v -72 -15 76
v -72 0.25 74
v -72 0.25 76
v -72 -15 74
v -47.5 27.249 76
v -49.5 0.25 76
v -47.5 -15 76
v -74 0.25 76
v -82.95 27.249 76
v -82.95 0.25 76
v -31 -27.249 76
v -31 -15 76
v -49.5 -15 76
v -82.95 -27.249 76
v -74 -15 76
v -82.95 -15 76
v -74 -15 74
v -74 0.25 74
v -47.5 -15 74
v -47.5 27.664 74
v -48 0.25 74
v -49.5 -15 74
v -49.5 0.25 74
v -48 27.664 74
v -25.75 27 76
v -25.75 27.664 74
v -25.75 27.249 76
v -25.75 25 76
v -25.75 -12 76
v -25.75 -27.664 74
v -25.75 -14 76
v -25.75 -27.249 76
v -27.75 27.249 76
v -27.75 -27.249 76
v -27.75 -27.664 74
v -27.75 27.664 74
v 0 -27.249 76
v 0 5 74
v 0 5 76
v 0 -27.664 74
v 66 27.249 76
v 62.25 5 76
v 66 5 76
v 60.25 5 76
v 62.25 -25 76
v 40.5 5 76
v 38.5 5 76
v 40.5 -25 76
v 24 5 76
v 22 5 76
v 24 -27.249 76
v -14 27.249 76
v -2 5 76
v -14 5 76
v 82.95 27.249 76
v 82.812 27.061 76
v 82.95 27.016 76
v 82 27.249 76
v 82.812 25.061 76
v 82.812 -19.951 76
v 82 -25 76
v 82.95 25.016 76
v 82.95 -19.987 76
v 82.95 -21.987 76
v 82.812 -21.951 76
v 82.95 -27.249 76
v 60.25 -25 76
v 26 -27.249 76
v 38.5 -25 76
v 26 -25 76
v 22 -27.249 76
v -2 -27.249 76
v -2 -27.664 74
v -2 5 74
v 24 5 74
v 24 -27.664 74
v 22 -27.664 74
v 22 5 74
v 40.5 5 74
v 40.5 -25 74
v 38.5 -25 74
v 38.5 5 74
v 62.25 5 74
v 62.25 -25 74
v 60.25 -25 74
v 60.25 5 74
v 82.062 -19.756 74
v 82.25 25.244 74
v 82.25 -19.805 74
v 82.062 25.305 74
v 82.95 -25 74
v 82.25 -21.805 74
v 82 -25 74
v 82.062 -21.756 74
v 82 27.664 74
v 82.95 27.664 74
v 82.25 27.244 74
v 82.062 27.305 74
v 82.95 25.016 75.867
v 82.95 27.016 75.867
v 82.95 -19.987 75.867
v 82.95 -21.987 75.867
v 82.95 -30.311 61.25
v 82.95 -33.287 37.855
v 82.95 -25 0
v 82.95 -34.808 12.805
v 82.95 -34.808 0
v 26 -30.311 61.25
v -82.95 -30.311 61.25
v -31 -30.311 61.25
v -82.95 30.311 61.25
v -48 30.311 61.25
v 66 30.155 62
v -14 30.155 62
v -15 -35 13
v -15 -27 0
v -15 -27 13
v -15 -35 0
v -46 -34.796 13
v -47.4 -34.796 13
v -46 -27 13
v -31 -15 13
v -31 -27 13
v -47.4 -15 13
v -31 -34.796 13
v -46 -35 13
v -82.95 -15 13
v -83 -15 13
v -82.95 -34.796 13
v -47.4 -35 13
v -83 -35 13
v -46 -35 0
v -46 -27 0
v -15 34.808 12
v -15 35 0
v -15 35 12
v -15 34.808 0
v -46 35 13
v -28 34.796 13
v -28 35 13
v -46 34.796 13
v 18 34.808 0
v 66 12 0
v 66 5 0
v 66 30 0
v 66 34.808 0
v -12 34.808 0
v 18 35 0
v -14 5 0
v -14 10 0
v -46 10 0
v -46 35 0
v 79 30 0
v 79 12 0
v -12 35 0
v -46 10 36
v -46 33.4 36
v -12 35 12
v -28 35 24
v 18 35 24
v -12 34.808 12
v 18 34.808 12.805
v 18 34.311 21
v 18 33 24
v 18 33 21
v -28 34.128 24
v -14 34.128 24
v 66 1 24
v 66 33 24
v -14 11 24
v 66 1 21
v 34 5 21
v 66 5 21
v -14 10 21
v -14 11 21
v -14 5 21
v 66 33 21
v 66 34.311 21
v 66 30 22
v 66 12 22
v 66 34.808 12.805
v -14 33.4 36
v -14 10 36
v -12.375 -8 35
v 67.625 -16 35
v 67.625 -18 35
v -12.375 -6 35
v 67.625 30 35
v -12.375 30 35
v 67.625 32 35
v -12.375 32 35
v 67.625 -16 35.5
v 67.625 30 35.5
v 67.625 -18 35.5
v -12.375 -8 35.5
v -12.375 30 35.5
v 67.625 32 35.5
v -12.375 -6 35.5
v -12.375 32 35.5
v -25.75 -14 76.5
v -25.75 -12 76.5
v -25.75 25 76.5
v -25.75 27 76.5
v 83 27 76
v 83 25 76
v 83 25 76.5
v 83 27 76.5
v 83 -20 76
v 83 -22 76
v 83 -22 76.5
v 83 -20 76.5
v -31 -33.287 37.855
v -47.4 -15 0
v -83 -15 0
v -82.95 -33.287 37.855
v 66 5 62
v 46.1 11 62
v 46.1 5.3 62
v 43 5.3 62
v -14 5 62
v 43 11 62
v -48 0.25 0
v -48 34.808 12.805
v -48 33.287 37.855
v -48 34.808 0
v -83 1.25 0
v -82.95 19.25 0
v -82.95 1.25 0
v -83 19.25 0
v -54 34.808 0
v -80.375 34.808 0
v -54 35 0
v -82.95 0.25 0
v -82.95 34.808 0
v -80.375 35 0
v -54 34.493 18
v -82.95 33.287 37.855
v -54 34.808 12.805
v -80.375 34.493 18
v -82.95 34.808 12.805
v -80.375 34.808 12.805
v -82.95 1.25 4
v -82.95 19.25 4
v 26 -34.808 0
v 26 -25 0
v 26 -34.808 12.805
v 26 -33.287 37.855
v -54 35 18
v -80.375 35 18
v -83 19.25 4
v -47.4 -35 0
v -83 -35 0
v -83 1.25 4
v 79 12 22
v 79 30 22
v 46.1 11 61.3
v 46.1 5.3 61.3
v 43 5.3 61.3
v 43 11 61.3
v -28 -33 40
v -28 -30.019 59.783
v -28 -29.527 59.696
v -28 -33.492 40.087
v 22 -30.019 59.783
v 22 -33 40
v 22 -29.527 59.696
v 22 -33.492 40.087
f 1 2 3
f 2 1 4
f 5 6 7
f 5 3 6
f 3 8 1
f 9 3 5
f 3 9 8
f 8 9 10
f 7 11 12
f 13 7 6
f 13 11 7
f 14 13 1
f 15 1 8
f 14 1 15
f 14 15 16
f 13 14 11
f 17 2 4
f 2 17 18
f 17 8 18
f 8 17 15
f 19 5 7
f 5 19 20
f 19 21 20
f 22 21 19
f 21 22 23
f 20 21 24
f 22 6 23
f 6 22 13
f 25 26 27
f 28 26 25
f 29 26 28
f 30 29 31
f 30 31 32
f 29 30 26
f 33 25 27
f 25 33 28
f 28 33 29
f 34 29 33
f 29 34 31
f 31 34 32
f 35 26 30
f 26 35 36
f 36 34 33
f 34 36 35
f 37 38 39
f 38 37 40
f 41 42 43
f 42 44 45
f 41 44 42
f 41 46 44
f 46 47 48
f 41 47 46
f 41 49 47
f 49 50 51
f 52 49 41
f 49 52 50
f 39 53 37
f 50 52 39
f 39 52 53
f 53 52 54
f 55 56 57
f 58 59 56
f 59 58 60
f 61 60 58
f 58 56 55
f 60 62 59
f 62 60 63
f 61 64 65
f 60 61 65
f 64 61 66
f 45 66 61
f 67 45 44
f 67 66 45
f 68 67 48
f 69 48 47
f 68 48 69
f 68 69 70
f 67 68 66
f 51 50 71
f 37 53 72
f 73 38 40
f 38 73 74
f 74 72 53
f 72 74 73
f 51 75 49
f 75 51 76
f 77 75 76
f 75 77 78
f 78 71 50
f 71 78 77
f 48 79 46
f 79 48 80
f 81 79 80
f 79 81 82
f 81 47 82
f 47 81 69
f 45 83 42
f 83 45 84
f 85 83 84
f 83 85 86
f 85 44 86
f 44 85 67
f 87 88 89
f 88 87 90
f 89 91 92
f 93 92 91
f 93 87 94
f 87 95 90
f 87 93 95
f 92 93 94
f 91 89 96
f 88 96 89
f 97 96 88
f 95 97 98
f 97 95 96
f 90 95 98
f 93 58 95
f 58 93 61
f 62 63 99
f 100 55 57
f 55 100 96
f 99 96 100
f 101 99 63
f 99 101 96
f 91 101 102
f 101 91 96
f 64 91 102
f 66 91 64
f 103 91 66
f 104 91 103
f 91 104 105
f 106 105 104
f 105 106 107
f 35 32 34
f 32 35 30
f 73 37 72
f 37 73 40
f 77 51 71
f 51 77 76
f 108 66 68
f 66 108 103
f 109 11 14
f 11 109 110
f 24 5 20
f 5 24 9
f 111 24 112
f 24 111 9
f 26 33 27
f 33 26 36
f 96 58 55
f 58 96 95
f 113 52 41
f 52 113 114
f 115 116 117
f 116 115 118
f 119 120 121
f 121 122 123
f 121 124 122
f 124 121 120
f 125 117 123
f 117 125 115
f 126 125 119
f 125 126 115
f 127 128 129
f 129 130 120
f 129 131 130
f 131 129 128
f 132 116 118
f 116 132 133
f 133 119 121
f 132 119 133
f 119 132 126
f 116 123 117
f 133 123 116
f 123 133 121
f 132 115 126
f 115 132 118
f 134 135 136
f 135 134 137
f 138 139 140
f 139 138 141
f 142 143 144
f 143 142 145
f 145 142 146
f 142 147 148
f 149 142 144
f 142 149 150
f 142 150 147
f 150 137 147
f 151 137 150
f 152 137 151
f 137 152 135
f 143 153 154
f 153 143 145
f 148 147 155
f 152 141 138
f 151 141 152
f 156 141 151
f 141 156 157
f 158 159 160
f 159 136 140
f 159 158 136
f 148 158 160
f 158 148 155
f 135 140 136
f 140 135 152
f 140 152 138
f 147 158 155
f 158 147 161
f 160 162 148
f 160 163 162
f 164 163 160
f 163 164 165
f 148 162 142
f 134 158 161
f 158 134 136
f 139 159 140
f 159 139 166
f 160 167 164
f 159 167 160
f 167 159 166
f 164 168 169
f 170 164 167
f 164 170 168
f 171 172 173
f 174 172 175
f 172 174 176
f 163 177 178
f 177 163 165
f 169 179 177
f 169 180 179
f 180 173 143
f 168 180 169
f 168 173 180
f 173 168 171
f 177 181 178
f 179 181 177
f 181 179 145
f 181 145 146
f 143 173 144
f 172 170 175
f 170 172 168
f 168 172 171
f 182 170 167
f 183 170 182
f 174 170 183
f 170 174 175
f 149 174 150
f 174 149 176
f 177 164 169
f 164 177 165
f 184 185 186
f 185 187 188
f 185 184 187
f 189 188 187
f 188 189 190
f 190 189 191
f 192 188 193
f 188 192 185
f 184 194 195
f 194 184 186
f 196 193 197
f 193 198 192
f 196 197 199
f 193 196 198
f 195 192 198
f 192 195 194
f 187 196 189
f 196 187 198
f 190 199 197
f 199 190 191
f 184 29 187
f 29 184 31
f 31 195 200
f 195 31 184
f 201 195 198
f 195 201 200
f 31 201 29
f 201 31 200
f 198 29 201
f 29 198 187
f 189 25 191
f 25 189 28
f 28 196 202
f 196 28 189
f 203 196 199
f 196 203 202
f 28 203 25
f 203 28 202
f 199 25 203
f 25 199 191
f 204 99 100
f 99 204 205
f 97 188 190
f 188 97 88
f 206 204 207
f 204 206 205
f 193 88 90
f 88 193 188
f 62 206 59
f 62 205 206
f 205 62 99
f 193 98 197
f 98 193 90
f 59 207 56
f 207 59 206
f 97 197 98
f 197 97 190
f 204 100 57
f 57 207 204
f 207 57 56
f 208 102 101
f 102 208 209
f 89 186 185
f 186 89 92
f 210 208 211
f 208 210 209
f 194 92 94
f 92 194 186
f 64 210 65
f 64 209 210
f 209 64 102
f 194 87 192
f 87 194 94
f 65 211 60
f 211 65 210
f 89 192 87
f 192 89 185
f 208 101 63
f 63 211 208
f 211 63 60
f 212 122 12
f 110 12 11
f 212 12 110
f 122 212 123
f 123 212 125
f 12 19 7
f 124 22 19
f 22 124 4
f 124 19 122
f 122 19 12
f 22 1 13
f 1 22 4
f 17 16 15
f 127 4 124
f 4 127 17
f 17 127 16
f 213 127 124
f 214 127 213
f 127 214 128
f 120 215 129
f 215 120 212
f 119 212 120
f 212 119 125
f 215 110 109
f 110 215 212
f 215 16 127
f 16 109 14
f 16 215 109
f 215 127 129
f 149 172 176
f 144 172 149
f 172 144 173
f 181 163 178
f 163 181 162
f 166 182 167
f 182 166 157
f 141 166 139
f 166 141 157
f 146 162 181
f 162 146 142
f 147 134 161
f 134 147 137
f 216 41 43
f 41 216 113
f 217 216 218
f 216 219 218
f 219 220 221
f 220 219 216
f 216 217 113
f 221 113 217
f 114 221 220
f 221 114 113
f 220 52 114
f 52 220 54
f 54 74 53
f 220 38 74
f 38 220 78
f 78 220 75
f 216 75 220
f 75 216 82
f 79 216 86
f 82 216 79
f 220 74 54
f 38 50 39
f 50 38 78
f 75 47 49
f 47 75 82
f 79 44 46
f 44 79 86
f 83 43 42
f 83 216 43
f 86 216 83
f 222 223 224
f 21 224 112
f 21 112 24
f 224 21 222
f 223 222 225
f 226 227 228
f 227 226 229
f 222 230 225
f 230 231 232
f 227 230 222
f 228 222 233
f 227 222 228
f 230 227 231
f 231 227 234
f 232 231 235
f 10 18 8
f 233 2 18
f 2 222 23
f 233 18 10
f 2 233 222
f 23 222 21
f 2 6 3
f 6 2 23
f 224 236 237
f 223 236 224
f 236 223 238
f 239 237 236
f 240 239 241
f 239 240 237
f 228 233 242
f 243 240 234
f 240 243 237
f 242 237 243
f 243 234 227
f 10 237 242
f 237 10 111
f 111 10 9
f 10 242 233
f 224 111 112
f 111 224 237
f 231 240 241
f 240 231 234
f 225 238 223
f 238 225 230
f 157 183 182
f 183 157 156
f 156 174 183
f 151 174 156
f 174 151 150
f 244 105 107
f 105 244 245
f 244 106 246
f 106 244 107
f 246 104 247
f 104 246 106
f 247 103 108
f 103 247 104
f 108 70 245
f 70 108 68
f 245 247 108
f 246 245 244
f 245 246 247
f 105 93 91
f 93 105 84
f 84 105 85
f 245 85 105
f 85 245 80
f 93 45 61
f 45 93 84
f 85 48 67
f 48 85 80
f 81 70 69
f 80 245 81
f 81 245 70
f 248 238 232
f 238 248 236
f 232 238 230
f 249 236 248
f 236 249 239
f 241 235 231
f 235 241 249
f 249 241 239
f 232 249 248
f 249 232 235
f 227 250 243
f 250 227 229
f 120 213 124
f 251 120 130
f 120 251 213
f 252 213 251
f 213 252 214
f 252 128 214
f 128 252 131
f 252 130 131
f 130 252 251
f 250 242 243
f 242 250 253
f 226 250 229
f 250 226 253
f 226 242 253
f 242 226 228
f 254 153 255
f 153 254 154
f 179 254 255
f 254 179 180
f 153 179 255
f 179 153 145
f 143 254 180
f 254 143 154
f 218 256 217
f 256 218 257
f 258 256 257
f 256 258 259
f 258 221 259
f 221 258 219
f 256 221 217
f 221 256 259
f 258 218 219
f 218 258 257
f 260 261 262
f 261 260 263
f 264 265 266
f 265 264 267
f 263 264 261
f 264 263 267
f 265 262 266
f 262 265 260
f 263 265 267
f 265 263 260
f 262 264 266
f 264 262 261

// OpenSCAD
//van 
vw=70;
vh=76;
vwh=56;
vl=166;

//wheel 
wl=31;
wh=13;
ww=8;
wo=37;

//toilet
tw=15+3/4;
th=18;
tl=26+3/8;

//water tank
//TRI-WH-2030-4
//fw=13;
//fh=12;
//fl=46;
//TRI-WH-2031
fw=20;
fh=12;
fl=30;
//TRI-WH-2037  
/*fw=19;
fh=12;
fl=38;*/
//TRI-WH-2030
//gw=20;
//gh=7;
//gl=50;
//TRI-WH-2030-4 # FUCK BOUGHT WRONG TANK!
gw=13;
gh=12;
gl=46;

//webasto
webh=12+1;
//webw=15.4+1;
webw=19+1;
webl=34.6+1;


//bed
beds=55.25;
bedtotal=166-beds;
bedl=80;
bedw1=50;
bedw2=40;
bedh=0.5;
strapl=(bedtotal-bedl)/2;
strapw=2;
bede=strapl+beds+bedl;
seats=105;
seattotal=166-seats;
seatstrapl=(seattotal-bedl/2)/2;
seate=seatstrapl+seats+bedl/2;

//shower pan
sw=18;
sh=4;
sl=35;

//mattress
bedsplit=32;

//fridge
fridgel=18;
fridgew=18;
fridgeh=22;

//projector
pw=5.7;
pl=3.1;
ph=0.7;

//foldout desk
fol=50;
fow=20;
foldout=0;

//bathroom
bw=tw+sw+1;
bh=vh;
bl=35;

//kitchen
kw=25;
kh=36;
kl=32;
ko=37;
ks=ko;
ke=ko+kl;


module hull() {
    translate([0.05,vw/2,0]) scale([1,1,3.5]) rotate([0,90,0]) cylinder(h = vl-0.1, r1 = vw/2, r2 = vw/2, center = false);
}
module tank(l,w,h) {
    //outlet
    ow=1.25;
    oh=1;
    //inlet
    ih=1;
    iw=1.25;
    //vent
    vh=1;
    vw=0.5;
    //outet
    color("red") translate([0,w/2,ow/2+1]) rotate([0,90,0]) cylinder(h = oh, r1 = ow/2, r2 = ow/2, center = false);
    //vent
    color("red") translate([0,w-vw/2-1,h-vw/2-1]) rotate([0,90,0]) cylinder(h = vh, r1 = vw/2, r2 = vw/2, center = false);
    //inlet
    color("red") translate([0,w/2,h-ih/2-1]) rotate([0,90,0]) cylinder(h = ih, r1 = iw/2, r2 = iw/2, center = false);
    
    translate([ih,0,0]) cube([l,w,h]);
}

module bedleft(bedthick=3) { 
    intersection() {
        bedonly(bedthick=bedthick);
        cube([200,bedsplit,bedthick]);
    }
}
module bedright(bedthick=3) {
    translate([0,-bedsplit,wh]) difference() {
        bedonly(bedthick=bedthick);
        translate([-0.1,0,-0.1]) cube([200+0.2,bedsplit,    bedthick+0.2]);
    }
}
module strap(sp,ep,w=2,h=0.5) {
        points = [
          [  sp[0],  sp[1]-w/2,  sp[2] ],  //0
          [ ep[0],  ep[1]-w/2,  ep[2] ],  //1
          [ ep[0],  ep[1]+w/2,  ep[2] ],  //2
          [  sp[0],  sp[1]+w/2,  sp[2] ],  //3
          [  sp[0],  sp[1]-w/2,  sp[2]+h ],  //4
          [ ep[0],  ep[1]-w/2,  ep[2] +h],  //5
          [ ep[0],  ep[1]+w/2,  ep[2] +h],  //6
          [  sp[0],  sp[1]+w/2,  sp[2] +h]];  //7 
          
        faces = [
          [0,1,2,3],  // bottom
          [4,5,1,0],  // front
          [7,6,5,4],  // top
          [5,6,2,1],  // right
          [6,7,3,2],  // back
          [7,4,0,3]]; // left
        polyhedron( points, faces );
}


module bedloveseatonly(bedheight=0,bedthick=bedh) {
    bedpoints = [
          [  0,  (bedw1-bedw2)/2,  bedheight ],  //0
          [ bedl/2,  0,  bedheight ],  //1
          [ bedl/2,  bedw1,  bedheight ],  //2
          [  0,  bedw1,  bedheight ],  //3
          [  0,  (bedw1-bedw2)/2,  bedthick+bedheight ],  //4
          [ bedl/2,  0,  bedthick+bedheight ],  //5
          [ bedl/2,  bedw1,  bedthick+bedheight ],  //6
          [  0,  bedw1,  bedthick+bedheight ]]; //7
          
        bedfaces = [
          [0,1,2,3],  // bottom
          [4,5,1,0],  // front
          [7,6,5,4],  // top
          [5,6,2,1],  // right
          [6,7,3,2],  // back
          [7,4,0,3]]; // left
    polyhedron( bedpoints, bedfaces );
}



module bedonly(bedheight=0,bedthick=bedh) {
    bedpoints = [
          [  0,  bedw1-bedw2,  bedheight ],  //0
          [ bedl,  0,  bedheight ],  //1
          [ bedl,  bedw1,  bedheight ],  //2
          [  0,  bedw1,  bedheight ],  //3
          [  0,  bedw1-bedw2,  bedthick+bedheight ],  //4
          [ bedl,  0,  bedthick+bedheight ],  //5
          [ bedl,  bedw1,  bedthick+bedheight ],  //6
          [  0,  bedw1,  bedthick+bedheight ]]; //7
          
        bedfaces = [
          [0,1,2,3],  // bottom
          [4,5,1,0],  // front
          [7,6,5,4],  // top
          [5,6,2,1],  // right
          [6,7,3,2],  // back
          [7,4,0,3]]; // left
    polyhedron( bedpoints, bedfaces );
}

module bed(bedheight=0,bedthick=bedh) {
        translate([beds+strapl,vw-bedw1-3,0]) bedonly(bedheight,bedthick);
        
        //back left strap
        strap([beds+strapl,vw-bedw2-3+strapw/2,bedheight],[beds+2,(vw-vwh)/2+strapw+13,vh]);
        //back right
        strap([beds+strapl,vw-3-strapw/2,bedheight],[beds+2,vw-(vw-vwh)/2-strapw,vh]);
        //front right
        strap([bede,vw-3-strapw/2,bedheight],[bede+strapl,vw-(vw-vwh)/2-strapw,vh]);
        //front left
        strap([bede,vw-bedw1-3+strapw/2,bedheight],[bede+strapl,(vw-vwh)/2+strapw+5,vh]);
        
}
//bed(bedheight=35);

module bedloveseat(bedheight=0,bedthick=bedh) {
        translate([seats+seatstrapl,vw-bedw1-3,0]) bedloveseatonly(bedheight,bedthick);
        
        //back left strap
        strap([seats+seatstrapl,vw-bedw2-3+strapw/2,bedheight],[seats+2,(vw-vwh)/2+strapw+13,vh]);
        //back right
        strap([seats+seatstrapl,vw-3-strapw/2,bedheight],[seats+2,vw-(vw-vwh)/2-strapw,vh]);
        //front right
        strap([seate,vw-3-strapw/2,bedheight],[bede+strapl,vw-(vw-vwh)/2-strapw,vh]);
        //front left
        strap([seate,vw-bedw1-3+strapw/2,bedheight],[bede+strapl,(vw-vwh)/2+strapw+5,vh]);
        
}
//bedloveseat(bedheight=30);


rotate([0,0,$t*360]) translate([-vl/2,-vw/2,0]) {

//beams
intersection() {
    for (x=[9,33.5,55.25,81,105,121.5,143.25,vl-1]){
        translate([x,0,vh-2]) cube([2,vw,2]);
    }
    hull();
}

//Wheel wells
color("grey",0.5) {
    translate([wo,0,0]) cube([wl,ww,wh]);
    translate([wo,vw-ww,0]) cube([wl,ww,wh]);
}

//Toilet 
translate([29-tl,vw-tw,0]) cube([tl,tw,th]);

//fresh water
color("Aquamarine",0.9) translate([70,vw-fw,0]) tank(fl,fw,fh);
//grey water tank
color("SkyBlue",0.9) translate([70-(gl-fl),vw-gw,fh]) tank(gl,gw,gh);

//webasto
translate([0,0,0]) cube([webl,webw,webh]);

//shower pan
translate([0,vw-tw-sw,0]) cube([sl,sw,sh]);

//mattress

translate([ke,vw-bedsplit-2,21]) rotate([0,0,0]) translate([0,0,0]) bedleft();

//fridge
color("orange") translate([vl-fridgel-4,vw-fridgew-5,0]) cube([fridgel,fridgew,fridgeh]);

//projector
color("red") translate([166-40,vw-pw-24,vh-14-ph]) cube([3.1,pw,0.7]);

//fold out desk by door
color("green",0.3) translate([166-57-fol-4,2,40]) rotate([80*(1-foldout),0,0]) cube([fol,fow,0.5]);

bed(bedheight=35);

//back storage
color("green",0.2)  intersection() {
    translate([0,0,webh]) cube([wo+wl-16,webw,vh-webh]);
    hull();
}

//side storage
color("green",0.2)  intersection() {
    translate([ke,vw-30,0]) cube([bedl,30,21]);
    hull();
}

//up storage
color("green",0.2)  intersection() {
    translate([ke,vw-30,vh-14]) cube([bedl,30,14]);
    hull();
}

//bathroom
color("blue",0.25) intersection() {
    translate([0,vw-bw,0]) cube([bl,bw,bh]);
    hull();
}
//kitchen
color("red",0.3) intersection() {
    translate([ko,vw-kw,0]) cube([kl,kw,kh]);
    hull();
}
//subtract out slide door
color("grey",0.2) intersection() {
    intersection() {
        translate([-0.1,0,0]) cube([vl+0.2,vw,vh]);
        hull();
    } 
    translate([vl-57,0,-1]) cube([57+0.1,10,vh+2]); 
}

}
